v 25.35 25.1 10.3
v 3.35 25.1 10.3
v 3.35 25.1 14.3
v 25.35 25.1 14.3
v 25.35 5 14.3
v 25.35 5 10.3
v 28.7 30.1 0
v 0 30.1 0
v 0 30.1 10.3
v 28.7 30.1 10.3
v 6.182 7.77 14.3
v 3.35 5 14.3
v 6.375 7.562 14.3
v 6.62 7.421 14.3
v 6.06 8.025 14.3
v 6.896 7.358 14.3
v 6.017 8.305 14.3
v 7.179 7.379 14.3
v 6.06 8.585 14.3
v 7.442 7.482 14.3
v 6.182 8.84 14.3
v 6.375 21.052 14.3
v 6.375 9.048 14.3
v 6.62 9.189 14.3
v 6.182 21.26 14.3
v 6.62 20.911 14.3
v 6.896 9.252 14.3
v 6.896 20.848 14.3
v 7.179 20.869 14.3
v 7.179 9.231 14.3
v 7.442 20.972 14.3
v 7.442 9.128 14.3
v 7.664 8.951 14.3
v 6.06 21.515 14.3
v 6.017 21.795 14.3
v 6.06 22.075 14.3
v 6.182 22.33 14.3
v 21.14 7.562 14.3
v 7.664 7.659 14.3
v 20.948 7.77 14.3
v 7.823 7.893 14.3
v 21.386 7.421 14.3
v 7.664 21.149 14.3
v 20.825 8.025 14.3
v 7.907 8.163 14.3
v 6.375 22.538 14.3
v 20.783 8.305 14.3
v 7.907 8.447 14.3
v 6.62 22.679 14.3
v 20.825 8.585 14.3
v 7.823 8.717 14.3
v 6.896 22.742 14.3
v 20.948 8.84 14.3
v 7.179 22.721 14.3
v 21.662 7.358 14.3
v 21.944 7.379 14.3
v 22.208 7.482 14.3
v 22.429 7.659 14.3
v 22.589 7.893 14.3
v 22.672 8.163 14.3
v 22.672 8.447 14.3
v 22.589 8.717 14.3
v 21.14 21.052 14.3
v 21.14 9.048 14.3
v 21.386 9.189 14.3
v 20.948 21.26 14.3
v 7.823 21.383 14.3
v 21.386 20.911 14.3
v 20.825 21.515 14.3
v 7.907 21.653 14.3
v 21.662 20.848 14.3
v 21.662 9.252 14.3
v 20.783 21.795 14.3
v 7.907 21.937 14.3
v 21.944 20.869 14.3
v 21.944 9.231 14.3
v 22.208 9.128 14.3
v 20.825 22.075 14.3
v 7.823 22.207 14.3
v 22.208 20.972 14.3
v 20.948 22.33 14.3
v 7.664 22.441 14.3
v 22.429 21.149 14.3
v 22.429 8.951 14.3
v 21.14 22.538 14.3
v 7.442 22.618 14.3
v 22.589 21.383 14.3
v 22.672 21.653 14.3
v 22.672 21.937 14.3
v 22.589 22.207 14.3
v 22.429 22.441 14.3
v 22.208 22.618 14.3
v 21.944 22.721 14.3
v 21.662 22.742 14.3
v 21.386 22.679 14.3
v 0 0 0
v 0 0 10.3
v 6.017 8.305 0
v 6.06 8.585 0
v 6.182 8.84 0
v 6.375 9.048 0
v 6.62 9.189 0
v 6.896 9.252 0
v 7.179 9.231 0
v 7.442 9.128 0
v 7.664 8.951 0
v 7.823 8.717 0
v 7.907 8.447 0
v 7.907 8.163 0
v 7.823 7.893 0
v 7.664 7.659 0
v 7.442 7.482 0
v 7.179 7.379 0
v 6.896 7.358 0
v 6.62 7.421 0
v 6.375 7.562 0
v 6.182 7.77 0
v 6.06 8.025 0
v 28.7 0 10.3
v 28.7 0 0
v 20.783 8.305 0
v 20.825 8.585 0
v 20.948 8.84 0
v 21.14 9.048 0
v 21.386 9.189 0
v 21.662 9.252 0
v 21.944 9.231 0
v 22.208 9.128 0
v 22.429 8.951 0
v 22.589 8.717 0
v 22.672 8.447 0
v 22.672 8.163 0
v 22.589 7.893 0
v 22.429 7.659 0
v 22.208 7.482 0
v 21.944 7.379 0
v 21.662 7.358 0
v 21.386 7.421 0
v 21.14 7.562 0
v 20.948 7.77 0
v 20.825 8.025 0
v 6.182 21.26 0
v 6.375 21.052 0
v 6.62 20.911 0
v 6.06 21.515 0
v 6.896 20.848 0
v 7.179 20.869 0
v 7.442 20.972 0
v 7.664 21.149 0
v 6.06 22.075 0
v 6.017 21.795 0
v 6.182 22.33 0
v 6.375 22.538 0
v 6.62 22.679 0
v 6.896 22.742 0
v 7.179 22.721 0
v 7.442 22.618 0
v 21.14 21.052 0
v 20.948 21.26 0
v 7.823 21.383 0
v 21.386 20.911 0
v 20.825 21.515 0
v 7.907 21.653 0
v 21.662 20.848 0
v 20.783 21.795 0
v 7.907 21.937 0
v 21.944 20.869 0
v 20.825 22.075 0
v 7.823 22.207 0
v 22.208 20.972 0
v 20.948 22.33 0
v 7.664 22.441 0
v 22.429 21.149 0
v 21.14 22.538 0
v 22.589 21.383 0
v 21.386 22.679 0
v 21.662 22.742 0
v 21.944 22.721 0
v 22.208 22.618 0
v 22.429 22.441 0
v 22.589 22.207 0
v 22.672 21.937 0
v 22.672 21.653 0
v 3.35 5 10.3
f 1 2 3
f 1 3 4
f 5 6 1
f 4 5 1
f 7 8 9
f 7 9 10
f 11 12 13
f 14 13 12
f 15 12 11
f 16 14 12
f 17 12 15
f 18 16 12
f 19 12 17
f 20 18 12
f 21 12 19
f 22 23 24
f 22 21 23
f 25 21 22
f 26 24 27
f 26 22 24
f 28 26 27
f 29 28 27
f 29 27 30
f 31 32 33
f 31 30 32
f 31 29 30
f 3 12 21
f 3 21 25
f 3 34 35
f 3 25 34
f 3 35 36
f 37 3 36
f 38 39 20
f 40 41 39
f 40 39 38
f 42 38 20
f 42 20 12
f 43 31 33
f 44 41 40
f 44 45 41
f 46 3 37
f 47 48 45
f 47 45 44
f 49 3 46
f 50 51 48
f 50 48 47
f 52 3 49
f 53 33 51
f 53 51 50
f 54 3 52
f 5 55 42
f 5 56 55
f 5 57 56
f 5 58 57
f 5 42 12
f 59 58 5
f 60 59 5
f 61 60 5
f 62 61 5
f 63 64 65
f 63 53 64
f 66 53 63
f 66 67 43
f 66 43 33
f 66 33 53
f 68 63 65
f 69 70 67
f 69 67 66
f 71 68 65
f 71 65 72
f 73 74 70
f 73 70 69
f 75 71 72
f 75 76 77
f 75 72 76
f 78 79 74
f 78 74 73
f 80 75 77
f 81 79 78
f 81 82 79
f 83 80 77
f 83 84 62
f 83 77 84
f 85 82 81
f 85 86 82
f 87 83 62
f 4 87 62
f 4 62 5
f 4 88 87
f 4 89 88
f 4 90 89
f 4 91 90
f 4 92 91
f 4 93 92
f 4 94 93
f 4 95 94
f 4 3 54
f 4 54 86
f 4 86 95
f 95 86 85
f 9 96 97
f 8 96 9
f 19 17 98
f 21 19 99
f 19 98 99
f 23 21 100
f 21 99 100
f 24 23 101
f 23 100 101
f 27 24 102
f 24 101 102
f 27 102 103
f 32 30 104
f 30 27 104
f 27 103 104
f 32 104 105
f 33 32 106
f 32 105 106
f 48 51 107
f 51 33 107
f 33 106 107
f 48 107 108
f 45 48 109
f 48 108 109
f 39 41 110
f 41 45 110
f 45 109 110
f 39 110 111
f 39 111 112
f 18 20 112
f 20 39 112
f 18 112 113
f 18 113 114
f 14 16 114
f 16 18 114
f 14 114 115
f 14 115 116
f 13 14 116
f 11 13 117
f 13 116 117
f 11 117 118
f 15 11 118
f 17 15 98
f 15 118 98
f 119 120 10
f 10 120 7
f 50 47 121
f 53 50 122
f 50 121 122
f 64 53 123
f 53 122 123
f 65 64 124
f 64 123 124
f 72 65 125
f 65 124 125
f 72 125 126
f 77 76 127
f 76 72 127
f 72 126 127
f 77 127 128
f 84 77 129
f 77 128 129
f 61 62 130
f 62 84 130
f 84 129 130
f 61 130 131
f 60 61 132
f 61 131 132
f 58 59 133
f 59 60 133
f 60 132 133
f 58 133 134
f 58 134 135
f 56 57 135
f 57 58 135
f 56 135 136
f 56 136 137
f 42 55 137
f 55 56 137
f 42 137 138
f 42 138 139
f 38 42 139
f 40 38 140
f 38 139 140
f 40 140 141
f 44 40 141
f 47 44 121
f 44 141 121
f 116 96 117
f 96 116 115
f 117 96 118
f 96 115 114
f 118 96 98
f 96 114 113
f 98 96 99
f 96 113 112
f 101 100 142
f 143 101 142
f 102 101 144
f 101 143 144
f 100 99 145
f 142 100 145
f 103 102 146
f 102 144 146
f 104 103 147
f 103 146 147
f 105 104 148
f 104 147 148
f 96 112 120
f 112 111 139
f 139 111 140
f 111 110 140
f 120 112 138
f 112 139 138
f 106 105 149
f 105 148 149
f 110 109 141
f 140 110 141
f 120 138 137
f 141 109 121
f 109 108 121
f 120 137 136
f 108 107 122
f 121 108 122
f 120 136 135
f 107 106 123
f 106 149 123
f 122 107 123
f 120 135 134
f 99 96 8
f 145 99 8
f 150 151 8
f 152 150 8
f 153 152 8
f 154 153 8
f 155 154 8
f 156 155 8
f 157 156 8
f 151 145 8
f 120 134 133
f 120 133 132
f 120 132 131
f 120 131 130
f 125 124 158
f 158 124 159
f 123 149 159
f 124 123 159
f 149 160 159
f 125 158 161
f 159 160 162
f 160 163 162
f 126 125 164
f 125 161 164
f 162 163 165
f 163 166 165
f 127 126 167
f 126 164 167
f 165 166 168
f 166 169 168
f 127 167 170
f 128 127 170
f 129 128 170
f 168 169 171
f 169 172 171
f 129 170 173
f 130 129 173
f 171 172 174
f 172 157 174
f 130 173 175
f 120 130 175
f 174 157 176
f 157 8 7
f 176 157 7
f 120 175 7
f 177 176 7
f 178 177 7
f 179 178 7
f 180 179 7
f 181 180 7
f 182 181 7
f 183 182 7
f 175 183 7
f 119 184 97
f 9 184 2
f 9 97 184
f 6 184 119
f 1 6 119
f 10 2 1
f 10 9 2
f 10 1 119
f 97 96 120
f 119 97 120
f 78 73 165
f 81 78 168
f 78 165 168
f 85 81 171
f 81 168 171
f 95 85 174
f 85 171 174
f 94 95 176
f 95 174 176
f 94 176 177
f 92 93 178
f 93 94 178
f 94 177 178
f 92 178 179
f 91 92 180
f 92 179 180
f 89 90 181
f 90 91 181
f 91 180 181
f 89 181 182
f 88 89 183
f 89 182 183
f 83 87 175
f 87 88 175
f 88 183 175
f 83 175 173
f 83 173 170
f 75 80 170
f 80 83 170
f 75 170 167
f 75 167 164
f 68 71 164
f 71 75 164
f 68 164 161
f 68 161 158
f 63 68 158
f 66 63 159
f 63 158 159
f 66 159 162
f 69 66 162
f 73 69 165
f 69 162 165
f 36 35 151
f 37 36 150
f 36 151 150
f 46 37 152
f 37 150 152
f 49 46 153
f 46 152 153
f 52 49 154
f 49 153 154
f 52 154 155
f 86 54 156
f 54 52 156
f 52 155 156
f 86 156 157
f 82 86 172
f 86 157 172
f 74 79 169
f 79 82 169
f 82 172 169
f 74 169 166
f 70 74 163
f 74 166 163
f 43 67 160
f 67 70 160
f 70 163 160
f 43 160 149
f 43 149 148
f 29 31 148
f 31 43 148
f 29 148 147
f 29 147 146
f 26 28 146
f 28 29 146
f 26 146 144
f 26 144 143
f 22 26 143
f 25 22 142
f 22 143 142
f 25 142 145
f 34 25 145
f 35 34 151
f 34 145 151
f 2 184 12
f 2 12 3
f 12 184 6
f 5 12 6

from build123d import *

# Parameters (mm, degrees)
SKETCH1_W           = 28.7
SKETCH1_H           = 30.1
BOSS_EXTRUDE1_DEPTH = 10.3
SKETCH2_W           = 22
SKETCH2_H           = 20.1
SKETCH2_R           = 0.95
BOSS_EXTRUDE2_DEPTH = 4
SKETCH4_R           = 0.95
CUT_EXTRUDE1_DEPTH  = 44.979427009


with BuildPart() as part:
    # Sketch1 → Boss-Extrude1 (new body)
    with BuildSketch(Plane.XY):
        with Locations((14.35, 15.05)):
            Rectangle(SKETCH1_W, SKETCH1_H)
    extrude(amount=BOSS_EXTRUDE1_DEPTH)

    # Sketch2 → Boss-Extrude2 (add)
    with BuildSketch(Plane.XY.offset(10.3)):
        with Locations((14.35, 15.05)):
            Rectangle(SKETCH2_W, SKETCH2_H)
        with Locations((6.967324962, 8.304919624)):
            Circle(SKETCH2_R, mode=Mode.SUBTRACT)
        with Locations(Location((6.967324962, 21.795080376, 0), (0, 0, 180))):
            Circle(SKETCH2_R, mode=Mode.SUBTRACT)
        with Locations(Location((21.732675038, 8.304919624, 0), (0, 0, 180))):
            Circle(SKETCH2_R, mode=Mode.SUBTRACT)
        with Locations((21.732675038, 21.795080376)):
            Circle(SKETCH2_R, mode=Mode.SUBTRACT)
    extrude(amount=BOSS_EXTRUDE2_DEPTH)

    # Sketch4 → Cut-Extrude1 (cut, through all)
    with BuildSketch(Plane(origin=(0, 0, 0), x_dir=(-1, 0, 0), z_dir=(0, 0, -1))):
        with Locations((-21.732675038, 21.795080376)):
            Circle(SKETCH4_R)
        with Locations((-21.732675038, 8.304919624)):
            Circle(SKETCH4_R)
        with Locations((-6.967324962, 8.304919624)):
            Circle(SKETCH4_R)
        with Locations((-6.967324962, 21.795080376)):
            Circle(SKETCH4_R)
    extrude(amount=-CUT_EXTRUDE1_DEPTH, mode=Mode.SUBTRACT)


solid = part.part
